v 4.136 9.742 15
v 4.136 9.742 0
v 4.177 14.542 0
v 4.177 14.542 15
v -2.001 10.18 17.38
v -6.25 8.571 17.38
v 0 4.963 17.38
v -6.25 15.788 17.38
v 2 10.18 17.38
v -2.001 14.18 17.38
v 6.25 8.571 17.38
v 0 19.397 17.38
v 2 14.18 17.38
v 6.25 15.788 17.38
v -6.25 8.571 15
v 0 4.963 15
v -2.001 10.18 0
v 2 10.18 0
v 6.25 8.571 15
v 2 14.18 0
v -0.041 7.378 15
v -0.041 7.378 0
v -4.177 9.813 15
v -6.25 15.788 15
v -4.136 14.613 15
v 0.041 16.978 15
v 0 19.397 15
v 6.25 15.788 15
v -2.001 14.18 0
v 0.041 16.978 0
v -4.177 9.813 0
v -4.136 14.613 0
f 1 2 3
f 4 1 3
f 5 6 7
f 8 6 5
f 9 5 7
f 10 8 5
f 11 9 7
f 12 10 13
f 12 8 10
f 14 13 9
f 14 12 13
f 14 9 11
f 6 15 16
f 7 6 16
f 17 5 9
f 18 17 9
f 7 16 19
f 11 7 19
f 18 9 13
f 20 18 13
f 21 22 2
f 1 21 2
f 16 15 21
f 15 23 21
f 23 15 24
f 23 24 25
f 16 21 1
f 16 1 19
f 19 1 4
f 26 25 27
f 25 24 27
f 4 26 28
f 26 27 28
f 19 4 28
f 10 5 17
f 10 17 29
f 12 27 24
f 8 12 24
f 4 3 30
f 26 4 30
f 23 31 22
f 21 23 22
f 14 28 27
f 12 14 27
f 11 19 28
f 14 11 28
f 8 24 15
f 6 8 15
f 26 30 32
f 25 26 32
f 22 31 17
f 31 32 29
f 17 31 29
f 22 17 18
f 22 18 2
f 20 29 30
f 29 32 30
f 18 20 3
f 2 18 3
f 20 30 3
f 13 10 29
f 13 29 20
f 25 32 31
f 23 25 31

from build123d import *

# Parameters (mm, degrees)
F1_DEPTH = 15
F3_DEPTH = 2.38
F4_W     = 4
F4_H     = 4
F5_DEPTH = 18


with BuildPart() as f1:
    # F0 (on Top) → F1 (new body)
    with BuildSketch(Plane.XY):
        Polygon((-0.04099, 7.37789), (4.136275, 9.742304), (4.177265, 14.542129), (0.04099, 16.97754), (-4.136275, 14.613126), (-4.177265, 9.813301), align=None)
    extrude(amount=F1_DEPTH)

    # F2 (on face) → F3 (join)
    with BuildSketch(Plane.XY.offset(15)):
        Polygon((6.25, 15.788207), (0, 19.396646), (-6.25, 15.788207), (-6.25, 8.571329), (0, 4.96289), (6.25, 8.571329), align=None)
    extrude(amount=F3_DEPTH)

    # F4 (on face) → F5 (cut)
    with BuildSketch(Plane.XY.offset(17.38)):
        with Locations((-0.0005, 12.17989)):
            Rectangle(F4_W, F4_H)
    extrude(amount=-F5_DEPTH, mode=Mode.SUBTRACT)


solid = f1.part
